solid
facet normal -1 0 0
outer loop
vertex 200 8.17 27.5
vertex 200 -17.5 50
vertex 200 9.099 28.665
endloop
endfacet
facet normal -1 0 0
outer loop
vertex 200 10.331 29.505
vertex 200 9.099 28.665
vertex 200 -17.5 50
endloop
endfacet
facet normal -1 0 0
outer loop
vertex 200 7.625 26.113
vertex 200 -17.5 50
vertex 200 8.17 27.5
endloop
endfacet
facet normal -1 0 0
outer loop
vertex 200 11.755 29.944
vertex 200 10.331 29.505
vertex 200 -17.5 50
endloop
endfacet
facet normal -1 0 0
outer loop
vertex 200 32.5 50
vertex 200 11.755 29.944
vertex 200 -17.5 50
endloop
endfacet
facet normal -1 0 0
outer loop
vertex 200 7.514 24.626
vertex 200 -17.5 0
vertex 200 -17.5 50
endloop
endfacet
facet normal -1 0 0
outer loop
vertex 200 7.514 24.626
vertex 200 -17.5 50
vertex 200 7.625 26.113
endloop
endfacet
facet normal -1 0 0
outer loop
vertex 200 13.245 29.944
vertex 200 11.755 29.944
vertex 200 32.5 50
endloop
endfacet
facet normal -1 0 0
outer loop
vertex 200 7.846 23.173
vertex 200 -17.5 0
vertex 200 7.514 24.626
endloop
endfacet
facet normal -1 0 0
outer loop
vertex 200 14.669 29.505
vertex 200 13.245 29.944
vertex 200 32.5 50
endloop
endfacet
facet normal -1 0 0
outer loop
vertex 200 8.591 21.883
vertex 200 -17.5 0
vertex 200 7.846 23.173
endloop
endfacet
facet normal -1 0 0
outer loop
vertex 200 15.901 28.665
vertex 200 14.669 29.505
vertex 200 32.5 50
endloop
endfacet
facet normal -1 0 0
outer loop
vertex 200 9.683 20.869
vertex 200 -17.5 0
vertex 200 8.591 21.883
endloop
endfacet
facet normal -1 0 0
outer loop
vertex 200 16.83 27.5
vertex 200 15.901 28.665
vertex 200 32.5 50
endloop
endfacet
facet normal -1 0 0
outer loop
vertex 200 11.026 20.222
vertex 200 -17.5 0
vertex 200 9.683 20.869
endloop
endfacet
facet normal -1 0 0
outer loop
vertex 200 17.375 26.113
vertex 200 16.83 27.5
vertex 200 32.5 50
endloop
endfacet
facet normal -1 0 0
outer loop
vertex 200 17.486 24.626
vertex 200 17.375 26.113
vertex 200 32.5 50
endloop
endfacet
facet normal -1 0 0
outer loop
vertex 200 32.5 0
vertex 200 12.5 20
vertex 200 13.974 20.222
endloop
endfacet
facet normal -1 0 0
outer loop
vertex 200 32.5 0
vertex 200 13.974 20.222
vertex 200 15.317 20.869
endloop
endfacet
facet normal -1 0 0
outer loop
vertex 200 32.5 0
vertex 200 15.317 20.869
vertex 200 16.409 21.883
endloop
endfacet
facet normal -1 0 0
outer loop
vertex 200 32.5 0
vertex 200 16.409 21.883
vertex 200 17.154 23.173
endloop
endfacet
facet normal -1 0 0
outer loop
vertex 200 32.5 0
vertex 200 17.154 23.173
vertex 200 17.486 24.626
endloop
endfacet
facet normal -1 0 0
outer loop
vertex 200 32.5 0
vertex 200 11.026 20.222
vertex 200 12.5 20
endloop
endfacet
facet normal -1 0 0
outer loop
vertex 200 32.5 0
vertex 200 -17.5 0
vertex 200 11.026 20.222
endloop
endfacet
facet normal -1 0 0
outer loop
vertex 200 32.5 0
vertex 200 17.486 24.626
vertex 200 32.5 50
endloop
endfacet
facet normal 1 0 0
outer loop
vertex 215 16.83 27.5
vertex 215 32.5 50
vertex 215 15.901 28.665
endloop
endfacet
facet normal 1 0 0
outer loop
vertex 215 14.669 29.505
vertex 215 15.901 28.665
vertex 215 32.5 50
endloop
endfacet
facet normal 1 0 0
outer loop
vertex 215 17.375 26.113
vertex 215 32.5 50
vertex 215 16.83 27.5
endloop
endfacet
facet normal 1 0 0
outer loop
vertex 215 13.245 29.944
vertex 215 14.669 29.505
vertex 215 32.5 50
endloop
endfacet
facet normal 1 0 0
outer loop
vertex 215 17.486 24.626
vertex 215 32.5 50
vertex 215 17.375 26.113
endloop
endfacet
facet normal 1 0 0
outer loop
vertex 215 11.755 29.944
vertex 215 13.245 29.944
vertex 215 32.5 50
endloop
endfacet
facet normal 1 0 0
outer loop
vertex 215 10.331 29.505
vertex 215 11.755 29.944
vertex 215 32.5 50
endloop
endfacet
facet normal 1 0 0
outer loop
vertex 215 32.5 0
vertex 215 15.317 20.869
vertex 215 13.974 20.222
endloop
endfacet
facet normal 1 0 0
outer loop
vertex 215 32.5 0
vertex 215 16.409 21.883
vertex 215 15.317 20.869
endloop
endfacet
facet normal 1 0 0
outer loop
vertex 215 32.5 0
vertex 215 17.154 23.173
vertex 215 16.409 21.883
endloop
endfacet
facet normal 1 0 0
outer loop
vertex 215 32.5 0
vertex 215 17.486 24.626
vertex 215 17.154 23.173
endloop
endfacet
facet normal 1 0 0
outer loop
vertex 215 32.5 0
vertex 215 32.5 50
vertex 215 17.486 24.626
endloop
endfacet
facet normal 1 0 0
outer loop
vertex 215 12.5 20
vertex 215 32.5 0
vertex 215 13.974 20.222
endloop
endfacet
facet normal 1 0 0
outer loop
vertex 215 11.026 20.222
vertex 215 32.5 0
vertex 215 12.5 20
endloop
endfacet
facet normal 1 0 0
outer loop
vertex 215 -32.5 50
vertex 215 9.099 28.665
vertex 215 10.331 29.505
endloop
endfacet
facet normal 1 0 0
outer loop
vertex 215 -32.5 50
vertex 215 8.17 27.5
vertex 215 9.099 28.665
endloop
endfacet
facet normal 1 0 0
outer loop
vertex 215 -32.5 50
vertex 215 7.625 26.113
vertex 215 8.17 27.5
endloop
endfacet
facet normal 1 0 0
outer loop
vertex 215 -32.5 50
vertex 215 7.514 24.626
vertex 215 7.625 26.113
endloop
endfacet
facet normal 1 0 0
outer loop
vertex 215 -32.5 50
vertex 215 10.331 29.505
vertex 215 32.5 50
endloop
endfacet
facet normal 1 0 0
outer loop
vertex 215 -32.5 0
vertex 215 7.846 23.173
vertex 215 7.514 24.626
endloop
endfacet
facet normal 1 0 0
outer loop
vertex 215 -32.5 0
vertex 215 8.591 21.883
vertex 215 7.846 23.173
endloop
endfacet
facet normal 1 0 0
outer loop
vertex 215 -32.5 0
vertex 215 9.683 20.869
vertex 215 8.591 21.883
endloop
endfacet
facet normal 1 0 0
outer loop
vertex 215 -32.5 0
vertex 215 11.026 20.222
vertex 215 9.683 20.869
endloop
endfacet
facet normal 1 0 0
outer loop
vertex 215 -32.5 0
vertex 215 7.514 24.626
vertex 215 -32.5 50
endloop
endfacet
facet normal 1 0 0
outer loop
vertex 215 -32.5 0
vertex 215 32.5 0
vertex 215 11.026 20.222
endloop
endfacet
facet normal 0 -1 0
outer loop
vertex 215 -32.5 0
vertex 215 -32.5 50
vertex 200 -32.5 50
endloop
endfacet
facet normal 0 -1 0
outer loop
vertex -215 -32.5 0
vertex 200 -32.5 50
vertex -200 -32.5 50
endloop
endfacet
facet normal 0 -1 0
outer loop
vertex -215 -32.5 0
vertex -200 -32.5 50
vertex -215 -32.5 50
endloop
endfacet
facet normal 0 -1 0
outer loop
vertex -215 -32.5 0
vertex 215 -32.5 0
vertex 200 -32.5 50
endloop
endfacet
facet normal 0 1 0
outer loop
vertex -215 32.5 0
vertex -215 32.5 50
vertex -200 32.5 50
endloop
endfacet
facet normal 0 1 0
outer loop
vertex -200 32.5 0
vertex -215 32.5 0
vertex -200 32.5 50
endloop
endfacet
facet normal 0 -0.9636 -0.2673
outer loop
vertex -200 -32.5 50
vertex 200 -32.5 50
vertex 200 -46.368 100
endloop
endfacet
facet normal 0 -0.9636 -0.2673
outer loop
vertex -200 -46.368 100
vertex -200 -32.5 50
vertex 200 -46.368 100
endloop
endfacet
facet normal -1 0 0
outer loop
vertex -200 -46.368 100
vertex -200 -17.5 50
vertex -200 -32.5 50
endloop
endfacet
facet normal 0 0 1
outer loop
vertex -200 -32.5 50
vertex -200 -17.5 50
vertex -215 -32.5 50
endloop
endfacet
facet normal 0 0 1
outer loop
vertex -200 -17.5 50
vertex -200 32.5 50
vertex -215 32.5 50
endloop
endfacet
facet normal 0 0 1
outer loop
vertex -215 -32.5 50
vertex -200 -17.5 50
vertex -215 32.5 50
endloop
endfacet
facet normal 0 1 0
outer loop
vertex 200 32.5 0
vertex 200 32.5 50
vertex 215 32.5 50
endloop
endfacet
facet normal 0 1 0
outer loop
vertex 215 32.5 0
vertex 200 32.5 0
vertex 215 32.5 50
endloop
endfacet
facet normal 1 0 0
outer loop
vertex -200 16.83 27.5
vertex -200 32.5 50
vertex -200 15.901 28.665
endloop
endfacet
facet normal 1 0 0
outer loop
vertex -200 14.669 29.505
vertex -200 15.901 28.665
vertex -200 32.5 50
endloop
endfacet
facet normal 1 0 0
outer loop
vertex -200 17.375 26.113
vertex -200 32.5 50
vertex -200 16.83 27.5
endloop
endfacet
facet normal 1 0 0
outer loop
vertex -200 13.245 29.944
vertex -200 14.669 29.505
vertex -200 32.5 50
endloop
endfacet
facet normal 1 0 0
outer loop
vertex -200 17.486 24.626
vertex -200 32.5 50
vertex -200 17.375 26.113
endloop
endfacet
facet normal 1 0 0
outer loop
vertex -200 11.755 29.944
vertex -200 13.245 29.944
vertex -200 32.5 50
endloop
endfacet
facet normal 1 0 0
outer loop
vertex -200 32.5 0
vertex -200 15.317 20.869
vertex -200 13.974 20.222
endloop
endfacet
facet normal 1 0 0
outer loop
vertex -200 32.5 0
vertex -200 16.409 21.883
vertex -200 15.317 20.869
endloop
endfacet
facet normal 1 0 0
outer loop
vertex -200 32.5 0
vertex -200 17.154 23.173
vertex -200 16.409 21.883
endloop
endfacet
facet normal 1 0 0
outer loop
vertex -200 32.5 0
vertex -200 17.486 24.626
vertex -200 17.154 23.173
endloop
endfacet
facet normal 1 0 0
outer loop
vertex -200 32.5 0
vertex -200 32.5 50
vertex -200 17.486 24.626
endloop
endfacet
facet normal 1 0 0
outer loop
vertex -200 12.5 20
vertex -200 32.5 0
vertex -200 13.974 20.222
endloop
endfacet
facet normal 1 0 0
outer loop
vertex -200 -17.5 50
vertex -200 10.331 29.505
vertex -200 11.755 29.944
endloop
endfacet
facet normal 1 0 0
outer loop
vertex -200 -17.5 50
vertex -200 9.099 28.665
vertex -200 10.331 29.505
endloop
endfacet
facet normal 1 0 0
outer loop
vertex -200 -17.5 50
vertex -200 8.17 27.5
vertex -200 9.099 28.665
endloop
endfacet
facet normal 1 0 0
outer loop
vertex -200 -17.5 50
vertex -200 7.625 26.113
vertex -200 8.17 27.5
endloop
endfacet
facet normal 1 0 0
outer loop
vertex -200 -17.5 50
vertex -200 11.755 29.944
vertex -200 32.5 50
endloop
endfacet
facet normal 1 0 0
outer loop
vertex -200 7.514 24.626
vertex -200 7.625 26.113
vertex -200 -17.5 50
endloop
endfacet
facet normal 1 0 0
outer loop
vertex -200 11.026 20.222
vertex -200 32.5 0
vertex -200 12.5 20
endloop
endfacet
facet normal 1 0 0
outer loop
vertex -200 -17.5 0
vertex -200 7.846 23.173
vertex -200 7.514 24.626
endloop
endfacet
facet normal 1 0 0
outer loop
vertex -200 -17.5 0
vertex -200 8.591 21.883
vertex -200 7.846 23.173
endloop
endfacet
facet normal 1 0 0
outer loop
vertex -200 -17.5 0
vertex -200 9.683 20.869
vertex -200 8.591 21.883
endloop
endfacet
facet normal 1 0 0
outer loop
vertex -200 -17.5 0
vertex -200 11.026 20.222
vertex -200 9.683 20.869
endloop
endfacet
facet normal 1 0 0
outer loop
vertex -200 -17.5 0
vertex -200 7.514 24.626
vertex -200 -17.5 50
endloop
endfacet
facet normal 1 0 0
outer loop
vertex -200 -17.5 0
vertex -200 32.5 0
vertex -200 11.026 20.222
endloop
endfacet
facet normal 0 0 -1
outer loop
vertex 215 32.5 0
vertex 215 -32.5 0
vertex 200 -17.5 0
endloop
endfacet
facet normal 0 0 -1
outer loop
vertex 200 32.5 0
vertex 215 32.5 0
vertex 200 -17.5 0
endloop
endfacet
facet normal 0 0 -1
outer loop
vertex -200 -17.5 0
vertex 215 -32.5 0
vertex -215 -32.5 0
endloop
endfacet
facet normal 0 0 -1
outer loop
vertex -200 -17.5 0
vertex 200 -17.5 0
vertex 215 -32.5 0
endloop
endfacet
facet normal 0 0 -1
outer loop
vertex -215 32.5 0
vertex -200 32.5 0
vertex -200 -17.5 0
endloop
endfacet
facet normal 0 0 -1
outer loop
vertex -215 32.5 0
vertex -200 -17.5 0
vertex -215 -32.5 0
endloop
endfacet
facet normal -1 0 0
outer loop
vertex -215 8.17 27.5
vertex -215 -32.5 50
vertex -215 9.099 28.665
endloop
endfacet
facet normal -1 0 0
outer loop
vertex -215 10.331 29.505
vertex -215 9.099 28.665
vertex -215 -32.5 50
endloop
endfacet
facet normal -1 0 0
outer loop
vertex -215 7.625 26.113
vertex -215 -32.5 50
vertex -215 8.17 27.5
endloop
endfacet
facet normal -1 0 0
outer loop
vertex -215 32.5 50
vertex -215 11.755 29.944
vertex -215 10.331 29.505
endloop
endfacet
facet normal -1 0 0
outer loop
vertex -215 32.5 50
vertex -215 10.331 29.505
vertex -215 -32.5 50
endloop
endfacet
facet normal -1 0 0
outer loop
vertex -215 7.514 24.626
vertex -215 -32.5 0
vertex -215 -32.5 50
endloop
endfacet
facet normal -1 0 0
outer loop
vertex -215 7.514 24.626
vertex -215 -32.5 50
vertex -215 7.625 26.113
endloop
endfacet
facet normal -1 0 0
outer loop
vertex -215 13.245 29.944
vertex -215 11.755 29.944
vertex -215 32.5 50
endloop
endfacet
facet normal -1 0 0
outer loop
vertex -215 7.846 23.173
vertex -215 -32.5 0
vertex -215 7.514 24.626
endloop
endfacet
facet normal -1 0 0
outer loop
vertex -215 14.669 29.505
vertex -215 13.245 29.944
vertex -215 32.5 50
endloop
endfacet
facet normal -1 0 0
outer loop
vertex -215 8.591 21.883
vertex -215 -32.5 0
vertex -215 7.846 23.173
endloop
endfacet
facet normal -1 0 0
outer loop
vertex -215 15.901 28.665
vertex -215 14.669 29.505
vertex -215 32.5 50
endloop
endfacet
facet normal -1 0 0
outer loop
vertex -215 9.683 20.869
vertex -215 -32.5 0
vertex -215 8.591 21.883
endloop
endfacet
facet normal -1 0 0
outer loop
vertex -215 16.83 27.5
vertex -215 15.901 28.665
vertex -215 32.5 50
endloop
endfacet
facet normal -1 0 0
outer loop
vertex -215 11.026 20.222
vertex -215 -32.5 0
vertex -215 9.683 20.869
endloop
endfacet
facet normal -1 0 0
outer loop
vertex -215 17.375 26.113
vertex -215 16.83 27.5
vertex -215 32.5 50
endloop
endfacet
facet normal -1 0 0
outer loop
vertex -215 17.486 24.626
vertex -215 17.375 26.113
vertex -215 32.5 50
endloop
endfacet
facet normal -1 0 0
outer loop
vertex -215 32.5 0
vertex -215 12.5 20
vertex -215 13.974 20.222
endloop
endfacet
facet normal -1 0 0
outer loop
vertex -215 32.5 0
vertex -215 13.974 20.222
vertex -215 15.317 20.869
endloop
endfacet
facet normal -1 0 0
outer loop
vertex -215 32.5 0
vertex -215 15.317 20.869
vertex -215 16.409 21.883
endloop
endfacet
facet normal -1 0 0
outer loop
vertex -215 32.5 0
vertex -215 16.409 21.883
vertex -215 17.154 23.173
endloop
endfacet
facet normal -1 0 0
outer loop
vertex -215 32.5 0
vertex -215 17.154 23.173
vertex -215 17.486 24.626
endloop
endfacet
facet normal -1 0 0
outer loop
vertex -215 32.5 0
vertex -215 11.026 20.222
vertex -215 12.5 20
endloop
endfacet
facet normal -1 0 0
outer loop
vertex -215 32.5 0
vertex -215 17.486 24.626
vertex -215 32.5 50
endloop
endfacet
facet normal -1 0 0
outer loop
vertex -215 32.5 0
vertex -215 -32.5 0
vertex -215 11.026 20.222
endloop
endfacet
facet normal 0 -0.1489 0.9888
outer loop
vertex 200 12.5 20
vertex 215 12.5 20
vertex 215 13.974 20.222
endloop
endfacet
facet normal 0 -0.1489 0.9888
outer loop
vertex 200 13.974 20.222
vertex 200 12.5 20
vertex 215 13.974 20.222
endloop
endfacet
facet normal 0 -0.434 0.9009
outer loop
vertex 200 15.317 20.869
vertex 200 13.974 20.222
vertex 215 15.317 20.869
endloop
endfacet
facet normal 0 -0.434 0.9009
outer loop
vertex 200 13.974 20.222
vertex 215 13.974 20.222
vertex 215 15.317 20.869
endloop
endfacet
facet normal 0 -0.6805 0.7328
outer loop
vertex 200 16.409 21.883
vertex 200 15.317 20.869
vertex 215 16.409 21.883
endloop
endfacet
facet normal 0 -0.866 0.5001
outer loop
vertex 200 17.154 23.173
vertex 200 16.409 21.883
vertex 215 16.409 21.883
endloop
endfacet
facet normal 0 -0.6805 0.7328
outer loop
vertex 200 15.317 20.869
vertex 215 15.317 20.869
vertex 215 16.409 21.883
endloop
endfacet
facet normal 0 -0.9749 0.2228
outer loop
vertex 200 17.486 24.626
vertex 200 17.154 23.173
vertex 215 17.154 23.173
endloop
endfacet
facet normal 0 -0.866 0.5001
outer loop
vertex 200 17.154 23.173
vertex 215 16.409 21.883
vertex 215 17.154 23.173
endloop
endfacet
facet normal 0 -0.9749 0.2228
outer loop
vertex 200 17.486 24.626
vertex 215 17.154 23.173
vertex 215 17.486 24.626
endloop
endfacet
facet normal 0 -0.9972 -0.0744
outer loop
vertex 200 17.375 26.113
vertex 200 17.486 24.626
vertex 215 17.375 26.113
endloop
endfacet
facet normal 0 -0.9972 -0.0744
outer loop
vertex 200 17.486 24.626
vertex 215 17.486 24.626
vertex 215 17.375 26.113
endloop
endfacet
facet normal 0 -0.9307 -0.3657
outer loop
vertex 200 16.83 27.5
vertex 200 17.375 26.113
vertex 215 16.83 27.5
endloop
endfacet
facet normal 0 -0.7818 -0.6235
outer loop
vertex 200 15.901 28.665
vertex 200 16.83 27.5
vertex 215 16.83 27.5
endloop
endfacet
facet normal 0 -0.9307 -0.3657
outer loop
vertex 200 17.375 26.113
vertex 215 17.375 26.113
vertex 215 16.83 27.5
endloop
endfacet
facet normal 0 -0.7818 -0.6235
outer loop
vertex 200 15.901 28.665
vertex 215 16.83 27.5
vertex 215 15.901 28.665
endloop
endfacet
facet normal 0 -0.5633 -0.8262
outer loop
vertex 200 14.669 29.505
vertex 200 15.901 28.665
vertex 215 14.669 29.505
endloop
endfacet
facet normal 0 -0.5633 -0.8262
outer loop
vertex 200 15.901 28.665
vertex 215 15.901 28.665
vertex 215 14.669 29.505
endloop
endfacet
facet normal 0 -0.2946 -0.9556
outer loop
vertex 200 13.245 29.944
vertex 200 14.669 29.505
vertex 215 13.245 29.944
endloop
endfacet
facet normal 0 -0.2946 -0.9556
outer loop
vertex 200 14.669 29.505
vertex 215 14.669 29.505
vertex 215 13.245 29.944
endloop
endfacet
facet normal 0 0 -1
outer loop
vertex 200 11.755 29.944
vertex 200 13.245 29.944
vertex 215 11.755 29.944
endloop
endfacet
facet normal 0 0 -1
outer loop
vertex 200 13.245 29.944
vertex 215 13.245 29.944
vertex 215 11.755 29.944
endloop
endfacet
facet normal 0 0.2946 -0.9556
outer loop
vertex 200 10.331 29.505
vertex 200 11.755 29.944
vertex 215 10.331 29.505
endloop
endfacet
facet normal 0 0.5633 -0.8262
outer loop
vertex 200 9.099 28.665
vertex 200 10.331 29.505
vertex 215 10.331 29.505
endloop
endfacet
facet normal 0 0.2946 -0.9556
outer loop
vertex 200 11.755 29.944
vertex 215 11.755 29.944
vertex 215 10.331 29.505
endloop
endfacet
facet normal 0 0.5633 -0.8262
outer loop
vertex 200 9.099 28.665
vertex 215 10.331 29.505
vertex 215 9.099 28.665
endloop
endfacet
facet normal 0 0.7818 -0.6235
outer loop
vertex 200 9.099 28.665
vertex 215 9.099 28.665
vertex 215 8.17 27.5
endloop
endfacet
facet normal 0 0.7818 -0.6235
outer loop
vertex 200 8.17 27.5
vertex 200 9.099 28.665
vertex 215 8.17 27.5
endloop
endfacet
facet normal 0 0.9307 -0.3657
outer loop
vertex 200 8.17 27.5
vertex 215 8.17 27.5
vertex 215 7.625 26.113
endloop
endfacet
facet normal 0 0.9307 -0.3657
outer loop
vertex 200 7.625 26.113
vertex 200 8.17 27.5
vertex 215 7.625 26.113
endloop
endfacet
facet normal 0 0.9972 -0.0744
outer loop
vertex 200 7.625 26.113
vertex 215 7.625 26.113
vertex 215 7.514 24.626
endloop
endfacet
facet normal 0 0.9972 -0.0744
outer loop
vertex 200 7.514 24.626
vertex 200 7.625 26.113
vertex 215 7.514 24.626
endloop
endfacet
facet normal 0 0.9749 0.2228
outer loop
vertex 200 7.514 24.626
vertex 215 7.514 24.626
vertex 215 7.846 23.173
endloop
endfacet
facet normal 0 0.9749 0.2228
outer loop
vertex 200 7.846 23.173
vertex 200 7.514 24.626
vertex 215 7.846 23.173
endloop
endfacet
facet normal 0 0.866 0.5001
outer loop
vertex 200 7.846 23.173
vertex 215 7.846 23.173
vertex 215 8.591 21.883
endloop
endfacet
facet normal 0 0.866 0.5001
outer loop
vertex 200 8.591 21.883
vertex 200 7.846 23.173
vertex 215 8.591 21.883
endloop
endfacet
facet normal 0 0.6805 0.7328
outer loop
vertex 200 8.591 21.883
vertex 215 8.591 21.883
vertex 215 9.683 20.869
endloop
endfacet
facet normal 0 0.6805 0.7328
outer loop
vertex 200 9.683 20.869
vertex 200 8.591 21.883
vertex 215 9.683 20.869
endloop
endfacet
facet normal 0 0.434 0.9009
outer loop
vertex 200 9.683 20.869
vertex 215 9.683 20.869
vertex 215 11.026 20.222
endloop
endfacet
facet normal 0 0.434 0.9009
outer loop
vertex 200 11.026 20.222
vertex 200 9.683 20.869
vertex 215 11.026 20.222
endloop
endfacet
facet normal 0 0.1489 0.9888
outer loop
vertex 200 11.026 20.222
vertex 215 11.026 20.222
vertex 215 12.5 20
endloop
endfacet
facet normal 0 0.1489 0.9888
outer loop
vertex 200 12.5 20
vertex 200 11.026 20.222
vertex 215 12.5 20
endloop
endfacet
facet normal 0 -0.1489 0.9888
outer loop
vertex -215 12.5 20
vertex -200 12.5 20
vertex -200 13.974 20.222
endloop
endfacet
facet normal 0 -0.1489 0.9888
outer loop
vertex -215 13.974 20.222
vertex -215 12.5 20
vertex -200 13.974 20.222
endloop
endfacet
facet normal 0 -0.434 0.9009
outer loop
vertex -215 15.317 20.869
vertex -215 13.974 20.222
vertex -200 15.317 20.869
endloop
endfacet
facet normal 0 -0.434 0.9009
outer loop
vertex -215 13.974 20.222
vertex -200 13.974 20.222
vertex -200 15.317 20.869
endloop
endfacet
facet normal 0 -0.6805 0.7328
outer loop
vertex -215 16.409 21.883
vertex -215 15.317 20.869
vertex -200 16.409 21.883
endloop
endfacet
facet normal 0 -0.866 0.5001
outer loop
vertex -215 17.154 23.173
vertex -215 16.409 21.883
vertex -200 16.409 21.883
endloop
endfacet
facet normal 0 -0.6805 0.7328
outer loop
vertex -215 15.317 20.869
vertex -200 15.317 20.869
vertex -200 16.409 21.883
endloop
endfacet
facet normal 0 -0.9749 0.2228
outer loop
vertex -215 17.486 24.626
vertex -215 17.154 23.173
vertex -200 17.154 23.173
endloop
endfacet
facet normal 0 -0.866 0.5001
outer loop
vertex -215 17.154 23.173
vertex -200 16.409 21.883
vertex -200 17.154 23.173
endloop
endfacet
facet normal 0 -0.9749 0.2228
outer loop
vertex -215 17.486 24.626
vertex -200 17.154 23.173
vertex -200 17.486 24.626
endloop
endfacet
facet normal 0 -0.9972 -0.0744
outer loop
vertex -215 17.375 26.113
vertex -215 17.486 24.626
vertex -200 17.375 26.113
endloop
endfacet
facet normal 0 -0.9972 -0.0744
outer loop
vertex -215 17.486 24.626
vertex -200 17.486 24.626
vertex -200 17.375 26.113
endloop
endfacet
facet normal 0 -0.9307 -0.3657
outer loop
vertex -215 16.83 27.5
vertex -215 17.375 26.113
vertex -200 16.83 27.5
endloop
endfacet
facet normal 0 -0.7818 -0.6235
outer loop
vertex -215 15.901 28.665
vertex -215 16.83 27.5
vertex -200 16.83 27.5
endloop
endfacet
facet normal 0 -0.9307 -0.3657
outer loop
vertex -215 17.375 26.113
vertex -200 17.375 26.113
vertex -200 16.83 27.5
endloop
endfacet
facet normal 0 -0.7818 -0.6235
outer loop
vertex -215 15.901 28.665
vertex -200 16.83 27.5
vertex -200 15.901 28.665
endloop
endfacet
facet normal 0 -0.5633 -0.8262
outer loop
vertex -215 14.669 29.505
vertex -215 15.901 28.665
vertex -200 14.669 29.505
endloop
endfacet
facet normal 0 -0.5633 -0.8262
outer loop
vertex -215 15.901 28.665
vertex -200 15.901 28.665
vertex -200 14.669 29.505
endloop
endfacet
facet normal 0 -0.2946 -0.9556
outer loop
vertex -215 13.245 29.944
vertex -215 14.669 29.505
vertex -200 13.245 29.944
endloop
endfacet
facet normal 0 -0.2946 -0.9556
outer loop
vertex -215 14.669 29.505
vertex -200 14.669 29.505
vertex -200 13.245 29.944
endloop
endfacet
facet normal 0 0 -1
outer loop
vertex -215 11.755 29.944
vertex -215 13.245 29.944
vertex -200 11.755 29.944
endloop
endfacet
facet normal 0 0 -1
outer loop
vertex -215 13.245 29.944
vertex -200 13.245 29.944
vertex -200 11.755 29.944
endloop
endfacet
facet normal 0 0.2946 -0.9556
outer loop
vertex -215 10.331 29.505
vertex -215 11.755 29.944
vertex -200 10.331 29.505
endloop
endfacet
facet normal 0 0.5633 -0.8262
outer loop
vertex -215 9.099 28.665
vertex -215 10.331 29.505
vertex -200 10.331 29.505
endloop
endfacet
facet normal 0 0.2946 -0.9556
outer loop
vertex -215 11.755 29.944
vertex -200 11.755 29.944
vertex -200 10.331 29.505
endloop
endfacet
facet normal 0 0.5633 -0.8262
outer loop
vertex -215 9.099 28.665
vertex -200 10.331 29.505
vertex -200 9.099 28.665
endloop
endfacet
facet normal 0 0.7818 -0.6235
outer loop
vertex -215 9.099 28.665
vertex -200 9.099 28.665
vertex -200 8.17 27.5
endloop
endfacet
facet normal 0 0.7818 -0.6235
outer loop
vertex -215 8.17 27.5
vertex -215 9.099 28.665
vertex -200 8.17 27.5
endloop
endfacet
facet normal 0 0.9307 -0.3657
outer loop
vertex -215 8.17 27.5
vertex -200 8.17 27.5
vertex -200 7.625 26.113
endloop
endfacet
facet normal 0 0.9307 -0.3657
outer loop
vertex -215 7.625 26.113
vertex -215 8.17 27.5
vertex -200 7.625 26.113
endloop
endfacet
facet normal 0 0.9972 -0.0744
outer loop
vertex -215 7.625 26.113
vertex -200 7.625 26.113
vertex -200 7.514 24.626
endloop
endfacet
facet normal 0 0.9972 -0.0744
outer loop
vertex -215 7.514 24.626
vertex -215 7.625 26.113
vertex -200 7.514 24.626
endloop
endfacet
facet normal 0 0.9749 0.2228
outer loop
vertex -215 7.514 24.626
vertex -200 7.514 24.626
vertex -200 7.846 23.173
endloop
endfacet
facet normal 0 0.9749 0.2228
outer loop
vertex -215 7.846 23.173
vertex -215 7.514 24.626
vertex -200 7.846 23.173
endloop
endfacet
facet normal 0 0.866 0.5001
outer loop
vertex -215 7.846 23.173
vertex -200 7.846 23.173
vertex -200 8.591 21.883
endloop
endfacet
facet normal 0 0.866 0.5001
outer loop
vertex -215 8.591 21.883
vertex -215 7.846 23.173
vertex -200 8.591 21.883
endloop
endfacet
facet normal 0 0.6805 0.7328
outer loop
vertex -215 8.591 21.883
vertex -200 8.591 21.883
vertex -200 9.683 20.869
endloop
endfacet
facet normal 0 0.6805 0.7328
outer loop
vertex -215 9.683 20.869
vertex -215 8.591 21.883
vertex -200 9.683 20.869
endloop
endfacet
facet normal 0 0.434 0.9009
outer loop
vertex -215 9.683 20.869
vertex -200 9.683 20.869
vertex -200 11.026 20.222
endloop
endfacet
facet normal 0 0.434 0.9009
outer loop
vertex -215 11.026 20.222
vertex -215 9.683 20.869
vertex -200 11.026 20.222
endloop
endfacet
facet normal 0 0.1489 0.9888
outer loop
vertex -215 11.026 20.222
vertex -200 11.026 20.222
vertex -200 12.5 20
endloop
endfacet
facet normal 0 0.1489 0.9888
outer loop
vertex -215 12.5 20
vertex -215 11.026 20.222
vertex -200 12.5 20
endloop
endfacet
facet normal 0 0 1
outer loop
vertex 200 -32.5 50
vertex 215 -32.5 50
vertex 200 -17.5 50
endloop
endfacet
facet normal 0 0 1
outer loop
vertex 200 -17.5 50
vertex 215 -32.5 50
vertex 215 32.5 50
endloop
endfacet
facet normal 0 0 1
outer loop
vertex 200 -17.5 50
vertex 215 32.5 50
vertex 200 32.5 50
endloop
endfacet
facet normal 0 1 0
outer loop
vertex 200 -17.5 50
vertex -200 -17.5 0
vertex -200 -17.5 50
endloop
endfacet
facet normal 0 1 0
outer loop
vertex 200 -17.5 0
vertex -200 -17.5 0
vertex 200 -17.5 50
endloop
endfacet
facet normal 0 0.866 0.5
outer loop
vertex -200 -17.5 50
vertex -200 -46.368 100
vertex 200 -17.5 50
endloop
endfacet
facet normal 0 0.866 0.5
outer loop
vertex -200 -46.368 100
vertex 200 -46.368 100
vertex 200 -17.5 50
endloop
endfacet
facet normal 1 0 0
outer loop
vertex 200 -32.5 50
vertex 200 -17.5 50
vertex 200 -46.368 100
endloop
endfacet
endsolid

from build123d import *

# Parameters (mm, degrees)
BOSS_EXTRUDE1_DEPTH = 50
SKETCH2_R           = 5
CUT_EXTRUDE1_DEPTH  = 477
BOSS_EXTRUDE2_DEPTH = 200


with BuildPart() as part:
    # Sketch1 → Boss-Extrude1 (new body)
    with BuildSketch(Plane.XY):
        Polygon((200, 32.5), (215, 32.5), (215, -32.5), (-215, -32.5), (-215, 32.5), (-200, 32.5), (-200, -17.5), (200, -17.5), align=None)
    extrude(amount=BOSS_EXTRUDE1_DEPTH)

    # Sketch2 → Cut-Extrude1 (cut)
    with BuildSketch(Plane(origin=(215, 0, 0), x_dir=(0, 0, -1), z_dir=(1, 0, 0))):
        with Locations((-25, 12.5)):
            Circle(SKETCH2_R)
    extrude(amount=-CUT_EXTRUDE1_DEPTH, mode=Mode.SUBTRACT)

    # Sketch3 → Boss-Extrude2 (add, symmetric)
    with BuildSketch(Plane(origin=(0, 0, 0), x_dir=(0, 0, -1), z_dir=(1, 0, 0))):
        Polygon((-50, -32.5), (-100, -46.367513459), (-50, -17.5), align=None)
    extrude(amount=BOSS_EXTRUDE2_DEPTH, both=True)


solid = part.part
